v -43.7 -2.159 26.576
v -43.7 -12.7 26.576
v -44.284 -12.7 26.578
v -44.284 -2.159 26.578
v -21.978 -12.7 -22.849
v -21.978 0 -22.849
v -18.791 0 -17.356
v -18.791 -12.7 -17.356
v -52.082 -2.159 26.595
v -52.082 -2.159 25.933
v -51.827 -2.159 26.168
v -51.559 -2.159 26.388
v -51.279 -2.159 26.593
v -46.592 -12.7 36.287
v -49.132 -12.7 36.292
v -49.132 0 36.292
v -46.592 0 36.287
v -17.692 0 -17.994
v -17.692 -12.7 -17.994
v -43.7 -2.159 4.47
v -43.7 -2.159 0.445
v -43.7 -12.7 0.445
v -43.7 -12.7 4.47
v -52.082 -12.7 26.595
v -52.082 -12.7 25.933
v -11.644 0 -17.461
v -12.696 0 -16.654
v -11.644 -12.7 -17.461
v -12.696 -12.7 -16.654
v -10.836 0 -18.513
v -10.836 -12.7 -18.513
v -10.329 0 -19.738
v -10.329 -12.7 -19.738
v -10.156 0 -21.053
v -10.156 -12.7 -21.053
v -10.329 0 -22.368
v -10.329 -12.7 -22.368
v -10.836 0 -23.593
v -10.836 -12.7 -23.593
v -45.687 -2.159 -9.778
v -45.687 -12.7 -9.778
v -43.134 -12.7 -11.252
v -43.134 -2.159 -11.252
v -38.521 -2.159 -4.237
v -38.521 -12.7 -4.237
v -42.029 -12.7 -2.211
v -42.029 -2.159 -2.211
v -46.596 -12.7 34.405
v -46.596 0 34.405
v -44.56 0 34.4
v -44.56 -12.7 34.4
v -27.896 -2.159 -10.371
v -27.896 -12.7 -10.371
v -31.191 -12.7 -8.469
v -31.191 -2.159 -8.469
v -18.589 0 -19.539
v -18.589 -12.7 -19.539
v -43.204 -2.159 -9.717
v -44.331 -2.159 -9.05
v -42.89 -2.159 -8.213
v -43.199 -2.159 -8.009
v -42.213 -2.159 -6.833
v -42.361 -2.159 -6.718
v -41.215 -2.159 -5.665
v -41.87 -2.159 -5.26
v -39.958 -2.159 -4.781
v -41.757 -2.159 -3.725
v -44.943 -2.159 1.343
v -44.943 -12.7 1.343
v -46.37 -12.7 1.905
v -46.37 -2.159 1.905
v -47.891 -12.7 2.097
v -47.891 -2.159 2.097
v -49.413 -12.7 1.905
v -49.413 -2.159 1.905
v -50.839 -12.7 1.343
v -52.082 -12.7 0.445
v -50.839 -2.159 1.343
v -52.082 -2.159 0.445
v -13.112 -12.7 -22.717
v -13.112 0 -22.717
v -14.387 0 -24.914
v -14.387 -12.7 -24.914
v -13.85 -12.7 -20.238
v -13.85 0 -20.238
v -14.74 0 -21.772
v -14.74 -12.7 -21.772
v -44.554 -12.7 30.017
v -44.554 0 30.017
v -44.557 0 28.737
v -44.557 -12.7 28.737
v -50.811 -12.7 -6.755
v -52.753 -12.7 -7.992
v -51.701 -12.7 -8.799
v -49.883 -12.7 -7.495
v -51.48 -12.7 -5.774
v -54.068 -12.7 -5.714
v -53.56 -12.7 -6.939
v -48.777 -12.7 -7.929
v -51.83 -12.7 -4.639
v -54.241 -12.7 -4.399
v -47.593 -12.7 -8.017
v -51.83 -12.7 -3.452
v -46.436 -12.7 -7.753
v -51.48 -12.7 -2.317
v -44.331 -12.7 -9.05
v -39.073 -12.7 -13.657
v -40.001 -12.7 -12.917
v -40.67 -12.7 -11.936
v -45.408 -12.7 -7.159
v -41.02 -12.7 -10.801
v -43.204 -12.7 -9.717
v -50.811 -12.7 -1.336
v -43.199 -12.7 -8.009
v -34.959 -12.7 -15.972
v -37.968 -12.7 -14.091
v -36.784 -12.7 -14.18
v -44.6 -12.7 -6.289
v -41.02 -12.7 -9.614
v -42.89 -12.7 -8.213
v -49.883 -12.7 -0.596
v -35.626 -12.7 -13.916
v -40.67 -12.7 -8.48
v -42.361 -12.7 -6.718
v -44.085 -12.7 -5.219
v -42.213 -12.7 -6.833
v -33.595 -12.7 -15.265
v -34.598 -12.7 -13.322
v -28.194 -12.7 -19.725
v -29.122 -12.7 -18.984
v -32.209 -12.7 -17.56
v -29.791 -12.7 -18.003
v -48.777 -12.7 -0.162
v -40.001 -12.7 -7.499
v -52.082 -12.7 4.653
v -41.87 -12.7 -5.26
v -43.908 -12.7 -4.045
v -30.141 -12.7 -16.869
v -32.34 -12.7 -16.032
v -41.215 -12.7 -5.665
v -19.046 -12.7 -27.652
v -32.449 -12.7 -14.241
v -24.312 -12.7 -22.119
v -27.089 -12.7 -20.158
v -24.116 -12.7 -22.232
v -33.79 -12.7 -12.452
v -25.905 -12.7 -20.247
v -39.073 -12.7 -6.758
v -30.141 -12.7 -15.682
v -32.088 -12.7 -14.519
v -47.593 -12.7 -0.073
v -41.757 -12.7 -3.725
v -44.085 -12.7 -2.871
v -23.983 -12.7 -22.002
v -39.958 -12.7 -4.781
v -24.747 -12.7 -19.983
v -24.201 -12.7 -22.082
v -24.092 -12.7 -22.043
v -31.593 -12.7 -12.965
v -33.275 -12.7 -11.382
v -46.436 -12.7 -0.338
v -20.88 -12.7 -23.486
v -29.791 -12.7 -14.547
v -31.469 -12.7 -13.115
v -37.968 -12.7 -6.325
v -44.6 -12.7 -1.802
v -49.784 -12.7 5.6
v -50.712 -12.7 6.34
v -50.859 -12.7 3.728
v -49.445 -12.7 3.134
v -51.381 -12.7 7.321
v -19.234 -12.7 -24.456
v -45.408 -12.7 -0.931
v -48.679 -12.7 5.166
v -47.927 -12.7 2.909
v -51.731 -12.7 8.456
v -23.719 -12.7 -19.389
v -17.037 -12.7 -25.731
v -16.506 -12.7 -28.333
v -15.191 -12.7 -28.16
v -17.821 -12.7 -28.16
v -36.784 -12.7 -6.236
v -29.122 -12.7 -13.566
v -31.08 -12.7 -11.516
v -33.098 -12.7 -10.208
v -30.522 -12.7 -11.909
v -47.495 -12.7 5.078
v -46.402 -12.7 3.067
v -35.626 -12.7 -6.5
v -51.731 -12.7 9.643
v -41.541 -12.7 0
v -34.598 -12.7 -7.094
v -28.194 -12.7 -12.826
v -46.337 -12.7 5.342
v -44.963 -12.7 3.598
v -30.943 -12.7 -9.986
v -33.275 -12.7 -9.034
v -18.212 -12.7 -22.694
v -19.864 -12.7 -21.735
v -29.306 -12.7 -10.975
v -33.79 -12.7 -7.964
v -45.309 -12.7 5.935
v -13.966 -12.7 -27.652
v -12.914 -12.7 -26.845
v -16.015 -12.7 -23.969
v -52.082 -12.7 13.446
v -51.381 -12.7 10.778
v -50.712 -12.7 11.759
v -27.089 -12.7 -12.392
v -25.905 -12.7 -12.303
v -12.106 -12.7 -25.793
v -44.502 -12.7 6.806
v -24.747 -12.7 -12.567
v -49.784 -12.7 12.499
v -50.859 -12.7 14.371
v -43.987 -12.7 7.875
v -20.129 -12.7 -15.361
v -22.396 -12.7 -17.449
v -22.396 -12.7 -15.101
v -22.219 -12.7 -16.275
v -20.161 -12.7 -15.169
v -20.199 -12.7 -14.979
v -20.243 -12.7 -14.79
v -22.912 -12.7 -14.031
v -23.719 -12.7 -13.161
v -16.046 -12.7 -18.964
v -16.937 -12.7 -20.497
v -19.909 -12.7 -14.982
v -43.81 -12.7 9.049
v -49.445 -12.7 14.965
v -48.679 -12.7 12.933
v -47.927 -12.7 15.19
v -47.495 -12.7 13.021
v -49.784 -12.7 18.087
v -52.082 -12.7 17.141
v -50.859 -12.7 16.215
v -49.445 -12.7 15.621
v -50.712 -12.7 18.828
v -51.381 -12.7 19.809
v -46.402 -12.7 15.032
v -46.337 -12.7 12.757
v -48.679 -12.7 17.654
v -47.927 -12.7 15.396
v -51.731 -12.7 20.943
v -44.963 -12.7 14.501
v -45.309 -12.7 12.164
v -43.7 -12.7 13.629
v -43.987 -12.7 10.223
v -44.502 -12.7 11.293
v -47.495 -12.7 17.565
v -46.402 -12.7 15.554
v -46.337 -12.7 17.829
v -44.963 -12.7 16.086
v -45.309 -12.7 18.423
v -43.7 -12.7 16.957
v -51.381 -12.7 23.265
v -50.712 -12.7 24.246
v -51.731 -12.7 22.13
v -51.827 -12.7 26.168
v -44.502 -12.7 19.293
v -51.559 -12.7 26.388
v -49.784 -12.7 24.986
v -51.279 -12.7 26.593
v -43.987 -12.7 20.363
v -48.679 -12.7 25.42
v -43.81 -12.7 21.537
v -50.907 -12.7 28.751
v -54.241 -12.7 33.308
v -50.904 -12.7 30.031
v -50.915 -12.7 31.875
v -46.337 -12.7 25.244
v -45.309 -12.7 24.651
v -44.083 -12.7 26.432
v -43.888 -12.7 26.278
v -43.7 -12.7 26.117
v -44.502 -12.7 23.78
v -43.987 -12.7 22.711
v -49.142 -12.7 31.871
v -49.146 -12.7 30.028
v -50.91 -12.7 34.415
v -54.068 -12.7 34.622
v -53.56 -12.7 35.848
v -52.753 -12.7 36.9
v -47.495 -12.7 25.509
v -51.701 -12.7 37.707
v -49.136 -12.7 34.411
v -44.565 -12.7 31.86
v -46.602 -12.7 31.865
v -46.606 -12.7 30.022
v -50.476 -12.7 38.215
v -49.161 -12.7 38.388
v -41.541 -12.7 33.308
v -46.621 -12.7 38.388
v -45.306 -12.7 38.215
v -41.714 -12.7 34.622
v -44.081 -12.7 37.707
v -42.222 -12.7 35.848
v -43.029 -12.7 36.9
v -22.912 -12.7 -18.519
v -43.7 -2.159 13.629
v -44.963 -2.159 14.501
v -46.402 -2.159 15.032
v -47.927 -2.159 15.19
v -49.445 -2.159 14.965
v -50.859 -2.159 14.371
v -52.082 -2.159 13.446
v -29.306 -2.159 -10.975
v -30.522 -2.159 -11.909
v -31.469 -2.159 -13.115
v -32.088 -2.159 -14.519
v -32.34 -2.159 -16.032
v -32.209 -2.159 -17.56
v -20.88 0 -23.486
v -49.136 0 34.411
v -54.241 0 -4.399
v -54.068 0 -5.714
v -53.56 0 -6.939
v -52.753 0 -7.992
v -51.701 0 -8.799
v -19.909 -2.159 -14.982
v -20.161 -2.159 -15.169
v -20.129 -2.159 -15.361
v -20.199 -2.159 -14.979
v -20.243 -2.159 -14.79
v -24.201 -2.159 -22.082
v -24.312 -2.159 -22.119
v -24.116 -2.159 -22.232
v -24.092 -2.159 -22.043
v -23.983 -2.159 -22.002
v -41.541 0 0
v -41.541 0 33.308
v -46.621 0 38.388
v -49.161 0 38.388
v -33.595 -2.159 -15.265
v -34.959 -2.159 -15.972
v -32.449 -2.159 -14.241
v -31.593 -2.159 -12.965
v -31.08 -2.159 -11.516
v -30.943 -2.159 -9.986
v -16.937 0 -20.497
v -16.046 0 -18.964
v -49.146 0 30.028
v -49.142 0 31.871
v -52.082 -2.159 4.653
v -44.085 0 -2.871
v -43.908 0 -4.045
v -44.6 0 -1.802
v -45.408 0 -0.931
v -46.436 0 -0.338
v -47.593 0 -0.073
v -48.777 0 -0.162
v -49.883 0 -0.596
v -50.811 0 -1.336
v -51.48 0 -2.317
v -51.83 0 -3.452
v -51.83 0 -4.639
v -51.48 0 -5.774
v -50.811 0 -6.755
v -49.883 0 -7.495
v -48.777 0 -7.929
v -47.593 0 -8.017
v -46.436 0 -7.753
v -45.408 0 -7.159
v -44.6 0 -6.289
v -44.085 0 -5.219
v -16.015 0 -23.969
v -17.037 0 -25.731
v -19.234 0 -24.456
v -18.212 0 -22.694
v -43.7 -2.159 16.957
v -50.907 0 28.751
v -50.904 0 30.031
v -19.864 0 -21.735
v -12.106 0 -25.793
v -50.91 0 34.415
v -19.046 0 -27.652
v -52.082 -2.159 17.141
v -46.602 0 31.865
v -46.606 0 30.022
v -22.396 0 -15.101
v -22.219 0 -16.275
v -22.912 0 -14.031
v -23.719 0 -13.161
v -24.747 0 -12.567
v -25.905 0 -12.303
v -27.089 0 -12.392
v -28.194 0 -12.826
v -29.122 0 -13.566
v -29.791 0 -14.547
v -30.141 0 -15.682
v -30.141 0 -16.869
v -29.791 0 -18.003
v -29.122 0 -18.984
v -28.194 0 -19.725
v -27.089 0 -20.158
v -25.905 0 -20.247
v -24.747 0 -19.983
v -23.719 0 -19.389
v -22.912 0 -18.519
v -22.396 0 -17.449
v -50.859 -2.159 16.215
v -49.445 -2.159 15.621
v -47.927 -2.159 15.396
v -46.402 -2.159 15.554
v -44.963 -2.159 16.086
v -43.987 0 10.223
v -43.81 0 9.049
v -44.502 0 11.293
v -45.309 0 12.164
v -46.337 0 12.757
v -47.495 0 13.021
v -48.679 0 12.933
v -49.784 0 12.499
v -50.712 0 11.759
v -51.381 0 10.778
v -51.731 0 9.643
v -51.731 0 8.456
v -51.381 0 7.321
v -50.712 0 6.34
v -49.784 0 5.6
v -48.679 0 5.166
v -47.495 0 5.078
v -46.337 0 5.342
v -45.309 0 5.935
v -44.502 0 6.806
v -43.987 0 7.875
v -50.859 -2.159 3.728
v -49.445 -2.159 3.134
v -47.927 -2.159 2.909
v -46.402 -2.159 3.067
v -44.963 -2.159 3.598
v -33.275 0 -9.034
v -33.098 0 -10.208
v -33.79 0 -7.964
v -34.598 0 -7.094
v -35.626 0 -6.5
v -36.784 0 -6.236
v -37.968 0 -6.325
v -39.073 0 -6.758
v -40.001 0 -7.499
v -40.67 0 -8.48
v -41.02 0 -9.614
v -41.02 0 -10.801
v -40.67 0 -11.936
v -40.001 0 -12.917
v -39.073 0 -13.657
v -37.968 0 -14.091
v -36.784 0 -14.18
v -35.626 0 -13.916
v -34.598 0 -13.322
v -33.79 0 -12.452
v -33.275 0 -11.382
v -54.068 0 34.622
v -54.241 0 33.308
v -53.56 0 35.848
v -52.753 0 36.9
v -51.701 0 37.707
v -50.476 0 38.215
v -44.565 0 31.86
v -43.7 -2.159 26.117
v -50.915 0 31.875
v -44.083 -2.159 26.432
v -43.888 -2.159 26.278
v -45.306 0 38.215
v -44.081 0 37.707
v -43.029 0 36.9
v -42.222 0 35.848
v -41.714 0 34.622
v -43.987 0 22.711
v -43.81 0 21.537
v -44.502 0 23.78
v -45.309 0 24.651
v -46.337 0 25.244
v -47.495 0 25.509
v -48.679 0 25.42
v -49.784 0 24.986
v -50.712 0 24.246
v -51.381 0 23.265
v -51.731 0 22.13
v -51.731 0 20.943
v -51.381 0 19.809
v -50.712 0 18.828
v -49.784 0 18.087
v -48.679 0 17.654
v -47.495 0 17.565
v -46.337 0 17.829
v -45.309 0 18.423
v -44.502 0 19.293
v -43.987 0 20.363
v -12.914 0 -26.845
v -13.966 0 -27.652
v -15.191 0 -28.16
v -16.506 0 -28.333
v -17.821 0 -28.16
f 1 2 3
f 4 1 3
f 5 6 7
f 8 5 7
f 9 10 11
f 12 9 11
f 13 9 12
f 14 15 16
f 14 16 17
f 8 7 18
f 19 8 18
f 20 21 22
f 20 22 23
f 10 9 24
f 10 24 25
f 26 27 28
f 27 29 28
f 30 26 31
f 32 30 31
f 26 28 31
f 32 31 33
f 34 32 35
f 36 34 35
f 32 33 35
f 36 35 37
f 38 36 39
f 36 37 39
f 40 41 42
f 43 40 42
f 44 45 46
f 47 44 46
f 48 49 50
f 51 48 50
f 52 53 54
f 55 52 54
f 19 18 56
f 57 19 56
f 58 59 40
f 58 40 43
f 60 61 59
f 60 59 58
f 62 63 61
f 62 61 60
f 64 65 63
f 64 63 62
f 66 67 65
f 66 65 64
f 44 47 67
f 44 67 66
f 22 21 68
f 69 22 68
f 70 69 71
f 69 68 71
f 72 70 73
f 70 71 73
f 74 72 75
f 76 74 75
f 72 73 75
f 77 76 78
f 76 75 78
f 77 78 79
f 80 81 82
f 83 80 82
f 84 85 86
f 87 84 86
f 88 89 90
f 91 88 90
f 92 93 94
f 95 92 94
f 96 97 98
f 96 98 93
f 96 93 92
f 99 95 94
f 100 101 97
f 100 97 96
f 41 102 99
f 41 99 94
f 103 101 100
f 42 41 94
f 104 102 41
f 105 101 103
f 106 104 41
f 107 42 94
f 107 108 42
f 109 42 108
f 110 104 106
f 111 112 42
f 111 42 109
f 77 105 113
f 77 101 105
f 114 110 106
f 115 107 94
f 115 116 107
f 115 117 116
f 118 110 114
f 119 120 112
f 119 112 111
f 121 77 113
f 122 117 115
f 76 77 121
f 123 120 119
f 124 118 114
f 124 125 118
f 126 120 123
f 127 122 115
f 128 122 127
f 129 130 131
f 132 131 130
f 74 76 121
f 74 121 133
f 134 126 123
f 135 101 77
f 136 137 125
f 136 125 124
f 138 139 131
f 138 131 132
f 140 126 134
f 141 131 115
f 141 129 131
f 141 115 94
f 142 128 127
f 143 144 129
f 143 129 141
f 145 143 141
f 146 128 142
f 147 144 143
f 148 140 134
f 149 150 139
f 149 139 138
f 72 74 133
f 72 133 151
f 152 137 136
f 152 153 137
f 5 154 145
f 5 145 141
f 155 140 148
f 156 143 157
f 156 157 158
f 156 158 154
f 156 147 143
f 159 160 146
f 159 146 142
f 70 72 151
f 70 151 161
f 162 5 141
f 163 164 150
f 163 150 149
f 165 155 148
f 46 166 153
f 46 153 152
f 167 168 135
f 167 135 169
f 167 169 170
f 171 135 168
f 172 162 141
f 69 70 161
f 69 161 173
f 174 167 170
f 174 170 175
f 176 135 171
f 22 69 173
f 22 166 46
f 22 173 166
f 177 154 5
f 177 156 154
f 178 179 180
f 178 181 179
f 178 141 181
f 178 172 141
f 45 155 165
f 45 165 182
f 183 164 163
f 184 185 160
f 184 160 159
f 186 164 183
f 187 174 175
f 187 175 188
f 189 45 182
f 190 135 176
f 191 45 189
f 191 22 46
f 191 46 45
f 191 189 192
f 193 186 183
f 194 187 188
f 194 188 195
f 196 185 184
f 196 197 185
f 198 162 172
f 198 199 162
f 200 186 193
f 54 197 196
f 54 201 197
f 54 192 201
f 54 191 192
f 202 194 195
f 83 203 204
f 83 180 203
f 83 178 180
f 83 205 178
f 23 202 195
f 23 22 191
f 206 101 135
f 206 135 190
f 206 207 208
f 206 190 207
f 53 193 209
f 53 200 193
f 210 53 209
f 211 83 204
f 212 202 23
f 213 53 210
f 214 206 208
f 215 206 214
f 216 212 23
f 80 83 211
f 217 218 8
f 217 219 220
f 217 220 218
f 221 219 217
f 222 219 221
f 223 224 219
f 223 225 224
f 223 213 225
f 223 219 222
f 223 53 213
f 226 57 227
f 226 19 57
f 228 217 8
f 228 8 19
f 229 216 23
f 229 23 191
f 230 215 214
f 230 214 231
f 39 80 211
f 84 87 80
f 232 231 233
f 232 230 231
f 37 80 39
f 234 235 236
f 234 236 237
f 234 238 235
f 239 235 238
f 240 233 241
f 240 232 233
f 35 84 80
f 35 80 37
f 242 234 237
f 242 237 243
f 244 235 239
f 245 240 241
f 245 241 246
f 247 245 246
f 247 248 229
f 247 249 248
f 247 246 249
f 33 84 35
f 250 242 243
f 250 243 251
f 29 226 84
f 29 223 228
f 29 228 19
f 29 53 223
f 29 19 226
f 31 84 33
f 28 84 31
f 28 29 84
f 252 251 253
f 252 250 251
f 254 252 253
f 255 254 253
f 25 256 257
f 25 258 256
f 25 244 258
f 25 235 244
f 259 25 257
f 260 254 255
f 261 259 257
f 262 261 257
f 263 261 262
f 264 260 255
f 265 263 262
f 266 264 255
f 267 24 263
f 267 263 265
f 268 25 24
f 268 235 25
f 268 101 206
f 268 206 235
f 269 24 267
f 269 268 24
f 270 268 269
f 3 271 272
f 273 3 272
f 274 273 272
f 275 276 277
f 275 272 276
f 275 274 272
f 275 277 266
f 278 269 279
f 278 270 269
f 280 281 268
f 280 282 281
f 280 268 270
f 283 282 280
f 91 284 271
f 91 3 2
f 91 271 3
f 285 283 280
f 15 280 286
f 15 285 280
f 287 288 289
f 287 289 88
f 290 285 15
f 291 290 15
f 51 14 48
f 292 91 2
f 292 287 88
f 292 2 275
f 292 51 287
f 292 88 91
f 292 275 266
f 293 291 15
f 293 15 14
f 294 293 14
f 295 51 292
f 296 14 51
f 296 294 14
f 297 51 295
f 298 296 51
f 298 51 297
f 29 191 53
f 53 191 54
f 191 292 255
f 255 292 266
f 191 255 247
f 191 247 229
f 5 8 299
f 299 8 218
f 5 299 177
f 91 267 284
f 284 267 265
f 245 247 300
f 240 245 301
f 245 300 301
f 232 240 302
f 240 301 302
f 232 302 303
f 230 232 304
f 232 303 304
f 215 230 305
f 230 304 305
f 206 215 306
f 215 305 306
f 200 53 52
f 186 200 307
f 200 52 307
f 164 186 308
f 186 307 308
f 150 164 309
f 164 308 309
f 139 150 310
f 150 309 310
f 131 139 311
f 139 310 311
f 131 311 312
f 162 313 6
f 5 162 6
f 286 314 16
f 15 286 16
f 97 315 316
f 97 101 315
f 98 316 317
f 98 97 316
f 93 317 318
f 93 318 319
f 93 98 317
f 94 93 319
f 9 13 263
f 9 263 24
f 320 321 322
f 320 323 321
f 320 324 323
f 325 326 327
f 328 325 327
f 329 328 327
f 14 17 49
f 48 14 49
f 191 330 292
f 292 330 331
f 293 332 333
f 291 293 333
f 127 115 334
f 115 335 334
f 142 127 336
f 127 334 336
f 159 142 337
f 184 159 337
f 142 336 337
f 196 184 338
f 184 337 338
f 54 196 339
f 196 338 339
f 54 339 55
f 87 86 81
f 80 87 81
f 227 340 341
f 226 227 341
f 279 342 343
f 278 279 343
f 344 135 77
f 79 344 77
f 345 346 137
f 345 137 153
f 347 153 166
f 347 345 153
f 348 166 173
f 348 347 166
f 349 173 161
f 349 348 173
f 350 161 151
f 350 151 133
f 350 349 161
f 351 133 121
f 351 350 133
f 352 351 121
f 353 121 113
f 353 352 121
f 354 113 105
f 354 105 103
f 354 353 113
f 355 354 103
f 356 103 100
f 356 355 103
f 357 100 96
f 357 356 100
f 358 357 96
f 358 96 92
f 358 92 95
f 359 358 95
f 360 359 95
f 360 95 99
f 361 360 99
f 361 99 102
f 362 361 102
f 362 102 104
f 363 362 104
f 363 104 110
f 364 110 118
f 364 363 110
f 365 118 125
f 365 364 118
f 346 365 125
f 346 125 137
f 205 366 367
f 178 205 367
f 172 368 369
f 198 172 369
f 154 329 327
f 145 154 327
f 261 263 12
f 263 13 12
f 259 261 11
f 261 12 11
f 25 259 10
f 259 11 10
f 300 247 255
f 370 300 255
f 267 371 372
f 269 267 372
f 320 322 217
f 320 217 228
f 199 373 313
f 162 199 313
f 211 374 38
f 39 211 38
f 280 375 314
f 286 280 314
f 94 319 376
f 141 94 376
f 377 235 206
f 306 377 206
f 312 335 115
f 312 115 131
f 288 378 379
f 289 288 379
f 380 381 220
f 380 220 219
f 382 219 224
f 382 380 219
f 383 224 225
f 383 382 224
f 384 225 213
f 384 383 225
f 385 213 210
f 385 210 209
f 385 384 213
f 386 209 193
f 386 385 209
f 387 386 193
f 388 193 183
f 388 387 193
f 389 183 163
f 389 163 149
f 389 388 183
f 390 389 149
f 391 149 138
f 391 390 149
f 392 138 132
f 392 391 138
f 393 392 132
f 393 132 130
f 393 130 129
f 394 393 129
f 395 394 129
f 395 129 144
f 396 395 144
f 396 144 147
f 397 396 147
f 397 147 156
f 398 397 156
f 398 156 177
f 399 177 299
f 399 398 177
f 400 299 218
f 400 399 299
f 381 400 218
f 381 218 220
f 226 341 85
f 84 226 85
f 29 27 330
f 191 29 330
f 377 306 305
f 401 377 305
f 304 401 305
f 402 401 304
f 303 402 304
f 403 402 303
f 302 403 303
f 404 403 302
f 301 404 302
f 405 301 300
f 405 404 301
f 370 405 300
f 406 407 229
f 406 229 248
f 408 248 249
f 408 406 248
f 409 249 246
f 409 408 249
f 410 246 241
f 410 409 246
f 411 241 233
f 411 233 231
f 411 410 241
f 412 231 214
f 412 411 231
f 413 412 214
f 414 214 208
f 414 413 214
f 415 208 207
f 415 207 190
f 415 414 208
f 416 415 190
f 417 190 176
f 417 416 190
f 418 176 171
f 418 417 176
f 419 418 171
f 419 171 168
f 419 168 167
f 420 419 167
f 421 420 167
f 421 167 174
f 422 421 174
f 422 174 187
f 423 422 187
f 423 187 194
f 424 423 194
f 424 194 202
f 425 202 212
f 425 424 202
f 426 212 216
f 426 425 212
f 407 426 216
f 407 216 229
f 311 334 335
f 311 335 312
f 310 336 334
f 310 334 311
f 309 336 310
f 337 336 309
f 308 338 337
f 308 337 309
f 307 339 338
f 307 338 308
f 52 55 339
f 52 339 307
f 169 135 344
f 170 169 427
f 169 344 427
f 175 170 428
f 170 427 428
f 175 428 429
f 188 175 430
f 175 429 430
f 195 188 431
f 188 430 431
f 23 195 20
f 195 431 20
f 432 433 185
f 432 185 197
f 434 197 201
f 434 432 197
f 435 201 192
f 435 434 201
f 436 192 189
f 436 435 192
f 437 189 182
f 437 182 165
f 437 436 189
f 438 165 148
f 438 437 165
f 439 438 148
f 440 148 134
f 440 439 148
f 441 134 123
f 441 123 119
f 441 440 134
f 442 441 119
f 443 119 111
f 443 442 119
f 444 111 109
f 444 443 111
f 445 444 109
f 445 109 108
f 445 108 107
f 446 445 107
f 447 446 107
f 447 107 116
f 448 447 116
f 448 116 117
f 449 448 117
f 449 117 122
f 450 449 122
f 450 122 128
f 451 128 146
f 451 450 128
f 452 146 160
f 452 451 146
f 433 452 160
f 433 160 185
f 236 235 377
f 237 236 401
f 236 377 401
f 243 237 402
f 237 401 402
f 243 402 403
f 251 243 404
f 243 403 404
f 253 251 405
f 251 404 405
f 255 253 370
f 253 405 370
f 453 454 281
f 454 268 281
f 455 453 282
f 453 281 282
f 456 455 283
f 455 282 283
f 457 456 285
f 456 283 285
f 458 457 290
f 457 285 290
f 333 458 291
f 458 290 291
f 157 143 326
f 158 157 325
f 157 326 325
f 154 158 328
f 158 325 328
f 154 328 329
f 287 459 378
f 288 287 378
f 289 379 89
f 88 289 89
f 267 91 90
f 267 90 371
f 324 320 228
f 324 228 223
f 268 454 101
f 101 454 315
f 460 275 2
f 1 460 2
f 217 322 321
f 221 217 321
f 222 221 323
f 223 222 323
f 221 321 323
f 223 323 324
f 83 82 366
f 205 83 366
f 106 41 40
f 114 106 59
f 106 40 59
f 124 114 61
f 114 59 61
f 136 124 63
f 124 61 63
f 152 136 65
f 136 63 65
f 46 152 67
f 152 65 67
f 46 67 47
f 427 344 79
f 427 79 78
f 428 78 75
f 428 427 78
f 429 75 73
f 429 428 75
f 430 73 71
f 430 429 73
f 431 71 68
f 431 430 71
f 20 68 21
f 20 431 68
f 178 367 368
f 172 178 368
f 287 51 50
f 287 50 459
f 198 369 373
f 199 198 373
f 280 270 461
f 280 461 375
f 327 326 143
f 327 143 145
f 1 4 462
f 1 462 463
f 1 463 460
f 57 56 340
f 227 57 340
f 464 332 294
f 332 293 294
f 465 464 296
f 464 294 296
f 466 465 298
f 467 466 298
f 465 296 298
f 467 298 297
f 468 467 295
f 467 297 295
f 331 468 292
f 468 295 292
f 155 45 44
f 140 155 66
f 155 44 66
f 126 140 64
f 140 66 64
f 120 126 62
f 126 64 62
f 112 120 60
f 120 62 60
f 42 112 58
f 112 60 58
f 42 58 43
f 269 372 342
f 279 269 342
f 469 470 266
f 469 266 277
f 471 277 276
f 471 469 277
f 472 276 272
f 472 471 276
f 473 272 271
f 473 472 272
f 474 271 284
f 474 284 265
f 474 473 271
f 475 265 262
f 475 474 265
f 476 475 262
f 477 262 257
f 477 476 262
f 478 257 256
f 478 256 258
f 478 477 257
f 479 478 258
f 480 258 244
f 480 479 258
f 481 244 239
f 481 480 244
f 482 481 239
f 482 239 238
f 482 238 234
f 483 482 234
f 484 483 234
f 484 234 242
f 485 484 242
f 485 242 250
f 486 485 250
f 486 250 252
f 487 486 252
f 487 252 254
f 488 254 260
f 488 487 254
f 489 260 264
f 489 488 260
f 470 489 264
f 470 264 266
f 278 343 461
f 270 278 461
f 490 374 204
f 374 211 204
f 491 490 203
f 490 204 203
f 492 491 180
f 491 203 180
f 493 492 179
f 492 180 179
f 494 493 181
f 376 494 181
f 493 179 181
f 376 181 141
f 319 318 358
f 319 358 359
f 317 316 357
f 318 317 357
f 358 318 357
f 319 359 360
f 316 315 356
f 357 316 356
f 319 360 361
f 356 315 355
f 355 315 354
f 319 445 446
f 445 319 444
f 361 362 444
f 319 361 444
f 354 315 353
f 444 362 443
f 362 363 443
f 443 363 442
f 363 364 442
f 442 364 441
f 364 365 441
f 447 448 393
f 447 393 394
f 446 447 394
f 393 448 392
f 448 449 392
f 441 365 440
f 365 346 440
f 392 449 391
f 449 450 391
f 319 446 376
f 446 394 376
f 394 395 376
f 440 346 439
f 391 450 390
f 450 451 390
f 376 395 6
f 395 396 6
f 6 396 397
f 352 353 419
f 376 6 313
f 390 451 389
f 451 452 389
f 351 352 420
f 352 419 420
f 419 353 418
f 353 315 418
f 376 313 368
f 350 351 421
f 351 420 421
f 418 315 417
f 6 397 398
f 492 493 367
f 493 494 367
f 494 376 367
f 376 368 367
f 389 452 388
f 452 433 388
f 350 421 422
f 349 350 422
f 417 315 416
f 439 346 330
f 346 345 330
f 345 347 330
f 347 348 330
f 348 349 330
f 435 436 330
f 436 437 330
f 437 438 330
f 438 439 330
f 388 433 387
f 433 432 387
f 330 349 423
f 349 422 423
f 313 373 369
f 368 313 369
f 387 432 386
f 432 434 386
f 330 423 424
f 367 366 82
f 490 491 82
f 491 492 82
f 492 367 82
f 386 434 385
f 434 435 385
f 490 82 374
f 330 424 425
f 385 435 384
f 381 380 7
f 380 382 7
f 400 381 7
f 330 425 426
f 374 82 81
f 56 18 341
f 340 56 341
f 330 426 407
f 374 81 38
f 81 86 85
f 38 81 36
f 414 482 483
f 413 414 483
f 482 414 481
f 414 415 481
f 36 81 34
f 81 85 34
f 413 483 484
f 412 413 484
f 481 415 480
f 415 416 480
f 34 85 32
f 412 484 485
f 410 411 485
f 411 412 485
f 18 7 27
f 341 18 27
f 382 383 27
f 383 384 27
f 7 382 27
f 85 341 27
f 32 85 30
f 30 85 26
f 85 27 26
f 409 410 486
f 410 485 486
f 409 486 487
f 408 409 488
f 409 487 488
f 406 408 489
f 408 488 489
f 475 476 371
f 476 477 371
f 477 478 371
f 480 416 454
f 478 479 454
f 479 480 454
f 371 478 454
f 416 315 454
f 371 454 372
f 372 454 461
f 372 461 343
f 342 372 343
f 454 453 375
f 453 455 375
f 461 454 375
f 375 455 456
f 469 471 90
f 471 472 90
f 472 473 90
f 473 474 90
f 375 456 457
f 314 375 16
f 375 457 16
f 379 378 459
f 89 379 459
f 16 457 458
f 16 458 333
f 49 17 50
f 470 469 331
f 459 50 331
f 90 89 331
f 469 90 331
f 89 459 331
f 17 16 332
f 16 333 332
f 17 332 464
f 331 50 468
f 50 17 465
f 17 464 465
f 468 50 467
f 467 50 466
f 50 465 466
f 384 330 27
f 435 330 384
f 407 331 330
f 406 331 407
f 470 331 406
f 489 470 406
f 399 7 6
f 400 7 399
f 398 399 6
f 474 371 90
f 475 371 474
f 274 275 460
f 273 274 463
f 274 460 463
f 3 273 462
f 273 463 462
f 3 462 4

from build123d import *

# Parameters (mm, degrees)
F0_R        = 4.7450397895
F0_R_2      = 3.9830397895
F1_DEPTH    = 12.7
F2_R        = 5.08
F3_R        = 5.08
F4_R        = 5.08
F5_R        = 5.08
F6_R        = 5.08
F7_T        = 2.159
F7_T3_DEPTH = 17.018


# Not quite as in the source:
# - a shell that OpenCascade refuses in one call is made with other operations: the cavity is built on its own and cut out


with BuildPart() as f1:
    # F0 (on Front) → F1 (new body)
    with BuildSketch(Plane.XZ):
        Polygon((-41.5410360719, 38.3876515813), (-54.2410360719, 38.3876515813), (-54.2410360719, -7.3323484187), (-14.6463546109, -30.1923484187), (-8.2963546109, -19.1938257906), (-41.5410360719, 0), align=None)
        with Locations((-47.8910360719, -4.0453961561)):
            Circle(F0_R, mode=Mode.SUBTRACT)
        with Locations((-37.0812863111, -10.2078355849)):
            Circle(F0_R, mode=Mode.SUBTRACT)
        with Locations((-26.2024924159, -16.2752047181)):
            Circle(F0_R, mode=Mode.SUBTRACT)
        Polygon((-16.936610418, -20.4973731492), (-16.0464954671, -18.9635408218), (-13.8496222672, -20.238432246), (-14.7397372181, -21.7722645735), (-13.1120789848, -22.7168286582), (-14.386970409, -24.9137018581), (-16.0146286424, -23.9691377734), (-17.0368508278, -25.7306152458), (-19.2337240277, -24.4557238215), (-18.2115018423, -22.6942463491), (-19.8636214544, -21.7354868152), (-20.8795533344, -23.4861249306), (-21.9779899344, -22.8486792184), (-18.7907613738, -17.3564962187), (-17.6923247738, -17.9939419308), (-18.5887300301, -19.5386136153), align=None, mode=Mode.SUBTRACT)
        with Locations((-47.7926284075, 9.0494407341)):
            Circle(F0_R, mode=Mode.SUBTRACT)
        with Locations((-47.7926284075, 21.5367097408)):
            Circle(F0_R, mode=Mode.SUBTRACT)
        Polygon((-49.1420680823, 31.8705764772), (-50.9154633185, 31.8745224733), (-50.909811558, 34.4145161854), (-49.1364163218, 34.4105701893), (-49.1322289456, 36.2924456105), (-46.5922352335, 36.2867938499), (-46.5964226097, 34.4049184288), (-44.5598272777, 34.4003867841), (-44.5654790382, 31.860393072), (-46.6020743702, 31.8649247167), (-46.6061752529, 30.0219208878), (-44.5537036309, 30.0173539166), (-44.5565518125, 28.7373345026), (-50.9065360928, 28.7514639039), (-50.9036879112, 30.0314833179), (-49.146168965, 30.0275726483), align=None, mode=Mode.SUBTRACT)
        with Locations((-47.7926284075, 21.5367097408)):
            Circle(F0_R)
        with Locations((-47.7926284075, 21.5367097408)):
            Circle(F0_R_2, mode=Mode.SUBTRACT)
        with Locations((-47.7926284075, 9.0494407341)):
            Circle(F0_R)
        with Locations((-47.7926284075, 9.0494407341)):
            Circle(F0_R_2, mode=Mode.SUBTRACT)
        with Locations((-47.8910360719, -4.0453961561)):
            Circle(F0_R)
        with Locations((-47.8910360719, -4.0453961561)):
            Circle(F0_R_2, mode=Mode.SUBTRACT)
        with Locations((-37.0812863111, -10.2078355849)):
            Circle(F0_R)
        with Locations((-37.0812863111, -10.2078355849)):
            Circle(F0_R_2, mode=Mode.SUBTRACT)
        with Locations((-26.2024924159, -16.2752047181)):
            Circle(F0_R)
        with Locations((-26.2024924159, -16.2752047181)):
            Circle(F0_R_2, mode=Mode.SUBTRACT)
    extrude(amount=F1_DEPTH)

    # F2
    f2_edges = [f1.edges().sort_by_distance(p)[0] for p in [
        (-8.296355, -6.35, -19.193826),
    ]]
    fillet(f2_edges, radius=F2_R)

    # F3
    f3_edges = [f1.edges().sort_by_distance(p)[0] for p in [
        (-14.646355, -6.35, -30.192348),
    ]]
    fillet(f3_edges, radius=F3_R)

    # F4
    f4_edges = [f1.edges().sort_by_distance(p)[0] for p in [
        (-54.241036, -6.35, 38.387652),
    ]]
    fillet(f4_edges, radius=F4_R)

    # F5
    f5_edges = [f1.edges().sort_by_distance(p)[0] for p in [
        (-41.541036, -6.35, 38.387652),
    ]]
    fillet(f5_edges, radius=F5_R)

    # F6
    f6_edges = [f1.edges().sort_by_distance(p)[0] for p in [
        (-54.241036, -6.35, -7.332348),
    ]]
    fillet(f6_edges, radius=F6_R)

    # F7: shell of thickness 2.159, made by hand


with BuildPart() as f7_core1:
    # F7_t2: copy of F1
    add(f1.part)

    # the walls: a layer under each face that stays
    f7_faces = [f7_core1.faces().sort_by_distance(p)[0] for p in [
        (-46.8934906703, 0, 5.0273561069),
        (-54.2410360719, -6.35, 14.454121265),
        (-53.5604451231, -6.35, -6.9394090512),
        (-52.7531385203, -6.35, 36.8997540297),
        (-35.373399867, -6.35, -18.2255832606),
        (-47.8910360719, -6.35, 38.3876515813),
        (-15.190962913, -6.35, -28.159842565),
        (-43.0289336235, -6.35, 36.8997540297),
        (-11.4713546109, -6.35, -24.6930871047),
        (-41.5410360719, -6.35, 16.6538257906),
        (-10.3288604645, -6.35, -19.7384340928),
        (-27.118399867, -6.35, -8.3269128953),
        (-51.775668197, -6.35, 21.5367097408),
        (-20.3843756541, -6.35, -20.1025877186),
        (-18.2415430738, -6.35, -17.6752190748),
        (-18.140527402, -6.35, -18.7662777731),
        (-17.7626702241, -6.35, -20.0179933823),
        (-16.4915529426, -6.35, -19.7304569855),
        (-14.9480588672, -6.35, -19.6009865339),
        (-14.2946797427, -6.35, -21.0053484098),
        (-13.9259081015, -6.35, -22.2445466159),
        (-13.7495246969, -6.35, -23.8152652582),
        (-15.2007995257, -6.35, -24.4414198157),
        (-16.5257397351, -6.35, -24.8498765096),
        (-18.1352874278, -6.35, -25.0931695336),
        (-18.722612935, -6.35, -23.5749850853),
        (-19.0375616483, -6.35, -22.2148665822),
        (-20.3715873944, -6.35, -22.6108058729),
        (-21.4287716344, -6.35, -23.1674020745),
        (-46.6041248116, -6.35, 30.9434228022),
        (-45.5799394419, -6.35, 30.0196374022),
        (-44.5551277217, -6.35, 29.3773442096),
        (-47.7315439526, -6.35, 28.7443992033),
        (-50.905112002, -6.35, 29.3914736109),
        (-50.0249284381, -6.35, 30.0295279831),
        (-49.1441185237, -6.35, 30.9490745627),
        (-50.0287657004, -6.35, 31.8725494752),
        (-50.9126374382, -6.35, 33.1445193293),
        (-50.0231139399, -6.35, 34.4125431874),
        (-49.1343226337, -6.35, 35.3515078999),
        (-47.8622320896, -6.35, 36.2896197302),
        (-46.5943289216, -6.35, 35.3458561394),
        (-45.5781249437, -6.35, 34.4026526065),
        (-44.562653158, -6.35, 33.130389928),
        (-45.5837767042, -6.35, 31.8626588943),
        (-51.8740758614, -6.35, -4.0453961561),
        (-41.0643261006, -6.35, -10.2078355849),
        (-51.775668197, -6.35, 9.0494407341),
        (-30.1855322054, -6.35, -16.2752047181),
    ]]
    thicken(f7_faces, amount=-F7_T, mode=Mode.SUBTRACT)

    # F7_s4 → F7_t3 (cut)
    with BuildSketch(Plane.XZ.offset(-2.159)):
        Polygon((-41.5086510719, 0.0186974885), (-43.7000360719, 0), (-43.7000360719, -1.2464992312), (-42.6205360719, -1.8697488468), align=None)
        Polygon((-21.9484799351, -22.8408423733), (-23.8453321543, -21.7650215078), (-24.9289898649, -23.6323637277), (-23.061647645, -24.7160214383), align=None)
        Polygon((-18.7829245287, -17.386006218), (-20.6581035937, -16.2728385081), (-19.5744458831, -14.4054962882), (-17.7071036632, -15.4891539988), align=None)
        Polygon((-17.7218347731, -18.0017787759), (-16.6086670632, -16.1265997109), (-14.7413248433, -17.2102574215), (-15.8249825539, -19.0775996414), align=None)
        Polygon((-16.038658622, -18.9930508211), (-17.913837687, -17.8798831112), (-16.8301799764, -16.0125408913), (-14.9628377565, -17.0961986019), align=None)
        Polygon((-13.8791322665, -20.2462690911), (-12.7659645566, -18.3710900261), (-10.8986223367, -19.4547477367), (-11.9822800473, -21.3220899566), align=None)
        Polygon((-13.1415889841, -22.7246655033), (-12.0284212742, -20.8494864383), (-10.1610790543, -21.9331441489), (-11.2447367649, -23.8004863688), align=None)
        Polygon((-14.3948072541, -24.8841918588), (-12.5196281891, -25.9973595687), (-13.6032858997, -27.8647017886), (-15.4706281196, -26.781044078), align=None)
        Polygon((-17.0446876729, -25.7011052464), (-15.1695086079, -26.8142729564), (-16.2531663185, -28.6816151763), (-18.1205085384, -27.5979574657), align=None)
        Polygon((-19.2042140284, -24.4478869764), (-20.3173817383, -26.3230660414), (-22.1847239582, -25.2394083308), (-21.1010662476, -23.3720661109), align=None)
        Polygon((-20.8873901795, -23.4566149313), (-19.0122111145, -24.5697826412), (-20.0958688251, -26.4371248611), (-21.963211045, -25.3534671505), align=None)
        Polygon((-44.5753416174, 29.99581201), (-44.5488996345, 32.1763485719), (-42.3899049792, 32.1715445754), (-42.3947089756, 30.0125499201), align=None)
        Polygon((-44.578093719, 28.7589724891), (-42.3975571572, 28.7325305062), (-42.4023611536, 26.5735358509), (-44.5613558089, 26.5783398473), align=None)
        Polygon((-50.8848981062, 28.7730058105), (-50.9113400892, 26.5924692486), (-53.0703347445, 26.597273245), (-53.0655307481, 28.7562679003), align=None)
        Polygon((-50.8821460046, 30.0098453313), (-53.0626825665, 30.0362873143), (-53.0578785701, 32.1952819696), (-50.8988839148, 32.1904779732), align=None)
        Polygon((-50.893825332, 31.8960643799), (-50.9202673149, 29.715527818), (-53.0792619702, 29.7203318144), (-53.0744579738, 31.8793264697), align=None)
        Polygon((-50.8882696514, 34.3928781989), (-53.0688062133, 34.4193201818), (-53.0640022169, 36.5783148371), (-50.9050075616, 36.5735108407), align=None)
        Polygon((-49.110687039, 36.2708076239), (-51.2912236009, 36.2972496069), (-51.2864196045, 38.4562442622), (-49.1274249492, 38.4514402658), align=None)
        Polygon((-46.61387322, 36.2652519434), (-46.5874312371, 38.4457885052), (-44.4284365818, 38.4409845088), (-44.4332405782, 36.2819898535), align=None)
        Polygon((-44.5814652642, 34.3788448775), (-44.5550232813, 36.5593814394), (-42.396028626, 36.554577443), (-42.4008326224, 34.3955827877), align=None)
        Polygon((-44.5870209448, 31.8820310585), (-42.4064843829, 31.8555890755), (-42.4112883793, 29.6965944202), (-44.5702830346, 29.7013984167), align=None)
    extrude(amount=F7_T3_DEPTH, mode=Mode.SUBTRACT)


with BuildPart() as f1_1:
    add(f1.part)

    # what is left inside the walls is the cavity
    f7_cavity = [f7_core1.part.solids().sort_by_distance(p)[0] for p in [
        (-51.708298, -9.186333, 26.296738),
        (-47.927745, -9.186333, 15.211589),
        (-47.927745, -9.186333, 2.887292),
        (-42.341594, -9.186333, -6.727564),
        (-43.971477, -9.186333, 26.372941),
        (-20.157914, -9.186333, -15.069631),
        (-31.573461, -9.186333, -12.974456),
        (-24.139328, -9.186333, -22.083275),
    ]]
    add(f7_cavity, mode=Mode.SUBTRACT)


solid = f1_1.part
